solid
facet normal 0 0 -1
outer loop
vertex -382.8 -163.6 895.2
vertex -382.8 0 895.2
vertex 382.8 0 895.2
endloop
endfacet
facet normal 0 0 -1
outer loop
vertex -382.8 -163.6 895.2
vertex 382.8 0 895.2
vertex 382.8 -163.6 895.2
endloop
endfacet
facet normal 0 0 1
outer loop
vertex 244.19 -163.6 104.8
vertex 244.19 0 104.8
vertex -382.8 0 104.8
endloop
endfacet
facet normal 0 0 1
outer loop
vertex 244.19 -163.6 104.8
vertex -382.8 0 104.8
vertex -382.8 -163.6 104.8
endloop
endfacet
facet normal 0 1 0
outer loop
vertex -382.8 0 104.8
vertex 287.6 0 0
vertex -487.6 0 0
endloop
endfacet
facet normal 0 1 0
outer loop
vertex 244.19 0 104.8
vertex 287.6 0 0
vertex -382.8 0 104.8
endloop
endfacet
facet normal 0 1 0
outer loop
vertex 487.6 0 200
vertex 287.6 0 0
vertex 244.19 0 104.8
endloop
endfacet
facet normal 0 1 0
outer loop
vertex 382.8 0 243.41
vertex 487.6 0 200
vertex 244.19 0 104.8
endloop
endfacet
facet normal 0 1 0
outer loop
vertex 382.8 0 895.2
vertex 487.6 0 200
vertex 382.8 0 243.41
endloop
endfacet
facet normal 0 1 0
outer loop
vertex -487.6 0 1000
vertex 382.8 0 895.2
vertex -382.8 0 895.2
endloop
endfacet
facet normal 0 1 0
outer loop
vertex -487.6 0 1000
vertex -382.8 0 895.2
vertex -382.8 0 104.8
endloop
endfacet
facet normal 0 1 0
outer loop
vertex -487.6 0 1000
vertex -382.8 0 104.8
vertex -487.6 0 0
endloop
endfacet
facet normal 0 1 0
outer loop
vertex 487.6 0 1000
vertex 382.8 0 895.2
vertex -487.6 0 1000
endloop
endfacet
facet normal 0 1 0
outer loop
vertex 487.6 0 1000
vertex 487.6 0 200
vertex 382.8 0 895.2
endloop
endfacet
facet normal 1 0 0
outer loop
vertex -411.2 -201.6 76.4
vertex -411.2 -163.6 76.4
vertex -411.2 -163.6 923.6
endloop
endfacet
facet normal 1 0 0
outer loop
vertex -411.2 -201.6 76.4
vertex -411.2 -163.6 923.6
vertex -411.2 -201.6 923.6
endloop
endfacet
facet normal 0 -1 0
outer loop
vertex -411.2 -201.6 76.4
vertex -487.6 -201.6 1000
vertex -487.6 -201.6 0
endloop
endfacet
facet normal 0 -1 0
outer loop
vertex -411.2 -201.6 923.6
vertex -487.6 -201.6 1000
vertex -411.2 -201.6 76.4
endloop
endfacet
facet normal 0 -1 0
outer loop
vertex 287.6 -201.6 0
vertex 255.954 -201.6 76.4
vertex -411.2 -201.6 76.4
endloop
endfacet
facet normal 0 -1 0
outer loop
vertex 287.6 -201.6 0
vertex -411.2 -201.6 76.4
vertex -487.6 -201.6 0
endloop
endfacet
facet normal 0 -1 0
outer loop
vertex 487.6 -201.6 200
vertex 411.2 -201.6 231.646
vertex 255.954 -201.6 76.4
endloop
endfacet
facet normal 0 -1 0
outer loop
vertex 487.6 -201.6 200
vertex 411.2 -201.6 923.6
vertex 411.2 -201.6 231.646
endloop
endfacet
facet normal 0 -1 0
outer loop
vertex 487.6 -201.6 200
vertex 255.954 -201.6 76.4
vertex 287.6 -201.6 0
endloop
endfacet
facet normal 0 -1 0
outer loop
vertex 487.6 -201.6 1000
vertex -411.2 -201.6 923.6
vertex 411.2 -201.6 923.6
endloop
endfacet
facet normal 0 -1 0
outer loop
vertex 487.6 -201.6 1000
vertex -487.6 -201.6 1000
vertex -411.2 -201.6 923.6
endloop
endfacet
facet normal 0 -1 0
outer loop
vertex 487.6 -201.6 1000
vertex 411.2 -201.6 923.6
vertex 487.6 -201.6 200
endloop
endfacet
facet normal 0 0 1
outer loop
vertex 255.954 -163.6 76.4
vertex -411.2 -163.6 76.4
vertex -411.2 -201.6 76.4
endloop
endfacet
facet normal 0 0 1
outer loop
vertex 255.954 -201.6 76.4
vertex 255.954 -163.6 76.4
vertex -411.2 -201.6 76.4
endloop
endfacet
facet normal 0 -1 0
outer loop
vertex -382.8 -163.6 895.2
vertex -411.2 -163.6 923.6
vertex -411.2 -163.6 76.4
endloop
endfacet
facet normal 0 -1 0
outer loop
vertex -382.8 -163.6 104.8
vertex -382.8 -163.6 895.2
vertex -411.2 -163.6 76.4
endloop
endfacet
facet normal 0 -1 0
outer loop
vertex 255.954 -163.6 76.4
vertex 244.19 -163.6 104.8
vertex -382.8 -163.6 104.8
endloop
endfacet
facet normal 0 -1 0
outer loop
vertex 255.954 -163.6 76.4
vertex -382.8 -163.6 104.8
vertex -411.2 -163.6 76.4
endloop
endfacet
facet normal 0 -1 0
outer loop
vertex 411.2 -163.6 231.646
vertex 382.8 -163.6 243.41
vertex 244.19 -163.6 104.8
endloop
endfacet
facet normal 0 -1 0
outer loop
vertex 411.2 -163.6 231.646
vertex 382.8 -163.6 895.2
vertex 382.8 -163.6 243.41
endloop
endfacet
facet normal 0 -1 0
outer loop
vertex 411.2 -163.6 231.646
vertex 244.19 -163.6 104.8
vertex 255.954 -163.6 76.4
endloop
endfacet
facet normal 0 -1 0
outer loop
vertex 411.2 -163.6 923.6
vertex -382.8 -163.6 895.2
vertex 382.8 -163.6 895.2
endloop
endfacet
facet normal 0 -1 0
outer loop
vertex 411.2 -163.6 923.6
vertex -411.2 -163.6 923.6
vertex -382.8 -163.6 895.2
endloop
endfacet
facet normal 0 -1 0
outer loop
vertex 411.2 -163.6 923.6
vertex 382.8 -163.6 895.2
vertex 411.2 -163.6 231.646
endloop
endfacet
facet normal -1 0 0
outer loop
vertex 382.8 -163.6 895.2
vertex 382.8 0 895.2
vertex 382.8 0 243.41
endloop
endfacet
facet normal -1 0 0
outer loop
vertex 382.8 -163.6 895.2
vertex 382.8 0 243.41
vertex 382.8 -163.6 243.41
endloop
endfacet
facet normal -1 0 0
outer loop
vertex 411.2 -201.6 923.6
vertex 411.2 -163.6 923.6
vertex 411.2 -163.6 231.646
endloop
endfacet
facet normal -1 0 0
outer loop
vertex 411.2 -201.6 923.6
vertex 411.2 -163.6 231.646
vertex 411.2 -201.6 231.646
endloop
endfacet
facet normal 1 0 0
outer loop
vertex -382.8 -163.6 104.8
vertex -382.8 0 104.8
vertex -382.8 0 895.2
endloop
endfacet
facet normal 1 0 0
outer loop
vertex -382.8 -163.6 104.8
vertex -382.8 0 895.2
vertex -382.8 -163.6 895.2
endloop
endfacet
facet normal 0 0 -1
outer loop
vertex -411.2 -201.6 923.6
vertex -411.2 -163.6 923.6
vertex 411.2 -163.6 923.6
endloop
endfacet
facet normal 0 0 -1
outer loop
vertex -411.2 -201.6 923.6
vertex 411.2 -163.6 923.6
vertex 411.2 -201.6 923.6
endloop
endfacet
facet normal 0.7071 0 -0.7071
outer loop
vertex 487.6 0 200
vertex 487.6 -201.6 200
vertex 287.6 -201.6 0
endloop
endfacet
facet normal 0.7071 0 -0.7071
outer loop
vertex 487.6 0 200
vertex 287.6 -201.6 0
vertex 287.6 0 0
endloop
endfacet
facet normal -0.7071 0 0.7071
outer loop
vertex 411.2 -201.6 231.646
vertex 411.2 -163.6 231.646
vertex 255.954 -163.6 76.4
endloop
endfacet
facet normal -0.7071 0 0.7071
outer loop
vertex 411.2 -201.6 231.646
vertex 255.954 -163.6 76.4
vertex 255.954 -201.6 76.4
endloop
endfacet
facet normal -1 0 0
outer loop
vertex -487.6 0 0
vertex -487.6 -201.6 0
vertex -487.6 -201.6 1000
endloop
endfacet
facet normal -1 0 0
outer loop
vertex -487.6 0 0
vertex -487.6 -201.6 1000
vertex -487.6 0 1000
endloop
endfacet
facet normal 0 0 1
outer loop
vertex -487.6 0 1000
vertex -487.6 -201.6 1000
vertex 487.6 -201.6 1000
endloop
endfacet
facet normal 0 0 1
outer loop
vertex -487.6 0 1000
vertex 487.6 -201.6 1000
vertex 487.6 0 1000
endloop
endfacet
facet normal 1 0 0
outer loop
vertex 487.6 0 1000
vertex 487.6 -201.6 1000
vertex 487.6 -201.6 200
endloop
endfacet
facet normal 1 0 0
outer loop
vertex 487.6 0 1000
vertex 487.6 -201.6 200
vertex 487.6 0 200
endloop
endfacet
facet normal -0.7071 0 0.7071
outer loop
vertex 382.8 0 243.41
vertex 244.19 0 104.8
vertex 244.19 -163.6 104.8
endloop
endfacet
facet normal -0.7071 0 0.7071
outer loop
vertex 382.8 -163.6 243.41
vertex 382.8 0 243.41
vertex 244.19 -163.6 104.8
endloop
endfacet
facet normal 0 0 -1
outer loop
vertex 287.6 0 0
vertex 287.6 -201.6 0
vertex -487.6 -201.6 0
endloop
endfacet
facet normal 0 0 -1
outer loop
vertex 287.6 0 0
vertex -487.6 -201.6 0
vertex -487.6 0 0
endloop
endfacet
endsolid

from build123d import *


with BuildPart() as f2:
    # F2: sweep along a path in F1
    with BuildLine(Plane.XZ) as f2_path:
        Line((0, 0), (287.6, 0))
        Line((287.6, 0), (487.6, 200))
        Line((487.6, 200), (487.6, 1000))
        Line((487.6, 1000), (-487.6, 1000))
        Line((-487.6, 1000), (-487.6, 0))
        Line((-487.6, 0), (0, 0))
    # F0 (on Right) → F2 (sweep)
    with BuildSketch(Plane.YZ):
        Polygon((-163.6, 76.4), (-201.6, 76.4), (-201.6, 0), (0, 0), (0, 104.8), (-163.6, 104.8), align=None)
    sweep(path=f2_path.line, transition=Transition.RIGHT)


solid = f2.part
